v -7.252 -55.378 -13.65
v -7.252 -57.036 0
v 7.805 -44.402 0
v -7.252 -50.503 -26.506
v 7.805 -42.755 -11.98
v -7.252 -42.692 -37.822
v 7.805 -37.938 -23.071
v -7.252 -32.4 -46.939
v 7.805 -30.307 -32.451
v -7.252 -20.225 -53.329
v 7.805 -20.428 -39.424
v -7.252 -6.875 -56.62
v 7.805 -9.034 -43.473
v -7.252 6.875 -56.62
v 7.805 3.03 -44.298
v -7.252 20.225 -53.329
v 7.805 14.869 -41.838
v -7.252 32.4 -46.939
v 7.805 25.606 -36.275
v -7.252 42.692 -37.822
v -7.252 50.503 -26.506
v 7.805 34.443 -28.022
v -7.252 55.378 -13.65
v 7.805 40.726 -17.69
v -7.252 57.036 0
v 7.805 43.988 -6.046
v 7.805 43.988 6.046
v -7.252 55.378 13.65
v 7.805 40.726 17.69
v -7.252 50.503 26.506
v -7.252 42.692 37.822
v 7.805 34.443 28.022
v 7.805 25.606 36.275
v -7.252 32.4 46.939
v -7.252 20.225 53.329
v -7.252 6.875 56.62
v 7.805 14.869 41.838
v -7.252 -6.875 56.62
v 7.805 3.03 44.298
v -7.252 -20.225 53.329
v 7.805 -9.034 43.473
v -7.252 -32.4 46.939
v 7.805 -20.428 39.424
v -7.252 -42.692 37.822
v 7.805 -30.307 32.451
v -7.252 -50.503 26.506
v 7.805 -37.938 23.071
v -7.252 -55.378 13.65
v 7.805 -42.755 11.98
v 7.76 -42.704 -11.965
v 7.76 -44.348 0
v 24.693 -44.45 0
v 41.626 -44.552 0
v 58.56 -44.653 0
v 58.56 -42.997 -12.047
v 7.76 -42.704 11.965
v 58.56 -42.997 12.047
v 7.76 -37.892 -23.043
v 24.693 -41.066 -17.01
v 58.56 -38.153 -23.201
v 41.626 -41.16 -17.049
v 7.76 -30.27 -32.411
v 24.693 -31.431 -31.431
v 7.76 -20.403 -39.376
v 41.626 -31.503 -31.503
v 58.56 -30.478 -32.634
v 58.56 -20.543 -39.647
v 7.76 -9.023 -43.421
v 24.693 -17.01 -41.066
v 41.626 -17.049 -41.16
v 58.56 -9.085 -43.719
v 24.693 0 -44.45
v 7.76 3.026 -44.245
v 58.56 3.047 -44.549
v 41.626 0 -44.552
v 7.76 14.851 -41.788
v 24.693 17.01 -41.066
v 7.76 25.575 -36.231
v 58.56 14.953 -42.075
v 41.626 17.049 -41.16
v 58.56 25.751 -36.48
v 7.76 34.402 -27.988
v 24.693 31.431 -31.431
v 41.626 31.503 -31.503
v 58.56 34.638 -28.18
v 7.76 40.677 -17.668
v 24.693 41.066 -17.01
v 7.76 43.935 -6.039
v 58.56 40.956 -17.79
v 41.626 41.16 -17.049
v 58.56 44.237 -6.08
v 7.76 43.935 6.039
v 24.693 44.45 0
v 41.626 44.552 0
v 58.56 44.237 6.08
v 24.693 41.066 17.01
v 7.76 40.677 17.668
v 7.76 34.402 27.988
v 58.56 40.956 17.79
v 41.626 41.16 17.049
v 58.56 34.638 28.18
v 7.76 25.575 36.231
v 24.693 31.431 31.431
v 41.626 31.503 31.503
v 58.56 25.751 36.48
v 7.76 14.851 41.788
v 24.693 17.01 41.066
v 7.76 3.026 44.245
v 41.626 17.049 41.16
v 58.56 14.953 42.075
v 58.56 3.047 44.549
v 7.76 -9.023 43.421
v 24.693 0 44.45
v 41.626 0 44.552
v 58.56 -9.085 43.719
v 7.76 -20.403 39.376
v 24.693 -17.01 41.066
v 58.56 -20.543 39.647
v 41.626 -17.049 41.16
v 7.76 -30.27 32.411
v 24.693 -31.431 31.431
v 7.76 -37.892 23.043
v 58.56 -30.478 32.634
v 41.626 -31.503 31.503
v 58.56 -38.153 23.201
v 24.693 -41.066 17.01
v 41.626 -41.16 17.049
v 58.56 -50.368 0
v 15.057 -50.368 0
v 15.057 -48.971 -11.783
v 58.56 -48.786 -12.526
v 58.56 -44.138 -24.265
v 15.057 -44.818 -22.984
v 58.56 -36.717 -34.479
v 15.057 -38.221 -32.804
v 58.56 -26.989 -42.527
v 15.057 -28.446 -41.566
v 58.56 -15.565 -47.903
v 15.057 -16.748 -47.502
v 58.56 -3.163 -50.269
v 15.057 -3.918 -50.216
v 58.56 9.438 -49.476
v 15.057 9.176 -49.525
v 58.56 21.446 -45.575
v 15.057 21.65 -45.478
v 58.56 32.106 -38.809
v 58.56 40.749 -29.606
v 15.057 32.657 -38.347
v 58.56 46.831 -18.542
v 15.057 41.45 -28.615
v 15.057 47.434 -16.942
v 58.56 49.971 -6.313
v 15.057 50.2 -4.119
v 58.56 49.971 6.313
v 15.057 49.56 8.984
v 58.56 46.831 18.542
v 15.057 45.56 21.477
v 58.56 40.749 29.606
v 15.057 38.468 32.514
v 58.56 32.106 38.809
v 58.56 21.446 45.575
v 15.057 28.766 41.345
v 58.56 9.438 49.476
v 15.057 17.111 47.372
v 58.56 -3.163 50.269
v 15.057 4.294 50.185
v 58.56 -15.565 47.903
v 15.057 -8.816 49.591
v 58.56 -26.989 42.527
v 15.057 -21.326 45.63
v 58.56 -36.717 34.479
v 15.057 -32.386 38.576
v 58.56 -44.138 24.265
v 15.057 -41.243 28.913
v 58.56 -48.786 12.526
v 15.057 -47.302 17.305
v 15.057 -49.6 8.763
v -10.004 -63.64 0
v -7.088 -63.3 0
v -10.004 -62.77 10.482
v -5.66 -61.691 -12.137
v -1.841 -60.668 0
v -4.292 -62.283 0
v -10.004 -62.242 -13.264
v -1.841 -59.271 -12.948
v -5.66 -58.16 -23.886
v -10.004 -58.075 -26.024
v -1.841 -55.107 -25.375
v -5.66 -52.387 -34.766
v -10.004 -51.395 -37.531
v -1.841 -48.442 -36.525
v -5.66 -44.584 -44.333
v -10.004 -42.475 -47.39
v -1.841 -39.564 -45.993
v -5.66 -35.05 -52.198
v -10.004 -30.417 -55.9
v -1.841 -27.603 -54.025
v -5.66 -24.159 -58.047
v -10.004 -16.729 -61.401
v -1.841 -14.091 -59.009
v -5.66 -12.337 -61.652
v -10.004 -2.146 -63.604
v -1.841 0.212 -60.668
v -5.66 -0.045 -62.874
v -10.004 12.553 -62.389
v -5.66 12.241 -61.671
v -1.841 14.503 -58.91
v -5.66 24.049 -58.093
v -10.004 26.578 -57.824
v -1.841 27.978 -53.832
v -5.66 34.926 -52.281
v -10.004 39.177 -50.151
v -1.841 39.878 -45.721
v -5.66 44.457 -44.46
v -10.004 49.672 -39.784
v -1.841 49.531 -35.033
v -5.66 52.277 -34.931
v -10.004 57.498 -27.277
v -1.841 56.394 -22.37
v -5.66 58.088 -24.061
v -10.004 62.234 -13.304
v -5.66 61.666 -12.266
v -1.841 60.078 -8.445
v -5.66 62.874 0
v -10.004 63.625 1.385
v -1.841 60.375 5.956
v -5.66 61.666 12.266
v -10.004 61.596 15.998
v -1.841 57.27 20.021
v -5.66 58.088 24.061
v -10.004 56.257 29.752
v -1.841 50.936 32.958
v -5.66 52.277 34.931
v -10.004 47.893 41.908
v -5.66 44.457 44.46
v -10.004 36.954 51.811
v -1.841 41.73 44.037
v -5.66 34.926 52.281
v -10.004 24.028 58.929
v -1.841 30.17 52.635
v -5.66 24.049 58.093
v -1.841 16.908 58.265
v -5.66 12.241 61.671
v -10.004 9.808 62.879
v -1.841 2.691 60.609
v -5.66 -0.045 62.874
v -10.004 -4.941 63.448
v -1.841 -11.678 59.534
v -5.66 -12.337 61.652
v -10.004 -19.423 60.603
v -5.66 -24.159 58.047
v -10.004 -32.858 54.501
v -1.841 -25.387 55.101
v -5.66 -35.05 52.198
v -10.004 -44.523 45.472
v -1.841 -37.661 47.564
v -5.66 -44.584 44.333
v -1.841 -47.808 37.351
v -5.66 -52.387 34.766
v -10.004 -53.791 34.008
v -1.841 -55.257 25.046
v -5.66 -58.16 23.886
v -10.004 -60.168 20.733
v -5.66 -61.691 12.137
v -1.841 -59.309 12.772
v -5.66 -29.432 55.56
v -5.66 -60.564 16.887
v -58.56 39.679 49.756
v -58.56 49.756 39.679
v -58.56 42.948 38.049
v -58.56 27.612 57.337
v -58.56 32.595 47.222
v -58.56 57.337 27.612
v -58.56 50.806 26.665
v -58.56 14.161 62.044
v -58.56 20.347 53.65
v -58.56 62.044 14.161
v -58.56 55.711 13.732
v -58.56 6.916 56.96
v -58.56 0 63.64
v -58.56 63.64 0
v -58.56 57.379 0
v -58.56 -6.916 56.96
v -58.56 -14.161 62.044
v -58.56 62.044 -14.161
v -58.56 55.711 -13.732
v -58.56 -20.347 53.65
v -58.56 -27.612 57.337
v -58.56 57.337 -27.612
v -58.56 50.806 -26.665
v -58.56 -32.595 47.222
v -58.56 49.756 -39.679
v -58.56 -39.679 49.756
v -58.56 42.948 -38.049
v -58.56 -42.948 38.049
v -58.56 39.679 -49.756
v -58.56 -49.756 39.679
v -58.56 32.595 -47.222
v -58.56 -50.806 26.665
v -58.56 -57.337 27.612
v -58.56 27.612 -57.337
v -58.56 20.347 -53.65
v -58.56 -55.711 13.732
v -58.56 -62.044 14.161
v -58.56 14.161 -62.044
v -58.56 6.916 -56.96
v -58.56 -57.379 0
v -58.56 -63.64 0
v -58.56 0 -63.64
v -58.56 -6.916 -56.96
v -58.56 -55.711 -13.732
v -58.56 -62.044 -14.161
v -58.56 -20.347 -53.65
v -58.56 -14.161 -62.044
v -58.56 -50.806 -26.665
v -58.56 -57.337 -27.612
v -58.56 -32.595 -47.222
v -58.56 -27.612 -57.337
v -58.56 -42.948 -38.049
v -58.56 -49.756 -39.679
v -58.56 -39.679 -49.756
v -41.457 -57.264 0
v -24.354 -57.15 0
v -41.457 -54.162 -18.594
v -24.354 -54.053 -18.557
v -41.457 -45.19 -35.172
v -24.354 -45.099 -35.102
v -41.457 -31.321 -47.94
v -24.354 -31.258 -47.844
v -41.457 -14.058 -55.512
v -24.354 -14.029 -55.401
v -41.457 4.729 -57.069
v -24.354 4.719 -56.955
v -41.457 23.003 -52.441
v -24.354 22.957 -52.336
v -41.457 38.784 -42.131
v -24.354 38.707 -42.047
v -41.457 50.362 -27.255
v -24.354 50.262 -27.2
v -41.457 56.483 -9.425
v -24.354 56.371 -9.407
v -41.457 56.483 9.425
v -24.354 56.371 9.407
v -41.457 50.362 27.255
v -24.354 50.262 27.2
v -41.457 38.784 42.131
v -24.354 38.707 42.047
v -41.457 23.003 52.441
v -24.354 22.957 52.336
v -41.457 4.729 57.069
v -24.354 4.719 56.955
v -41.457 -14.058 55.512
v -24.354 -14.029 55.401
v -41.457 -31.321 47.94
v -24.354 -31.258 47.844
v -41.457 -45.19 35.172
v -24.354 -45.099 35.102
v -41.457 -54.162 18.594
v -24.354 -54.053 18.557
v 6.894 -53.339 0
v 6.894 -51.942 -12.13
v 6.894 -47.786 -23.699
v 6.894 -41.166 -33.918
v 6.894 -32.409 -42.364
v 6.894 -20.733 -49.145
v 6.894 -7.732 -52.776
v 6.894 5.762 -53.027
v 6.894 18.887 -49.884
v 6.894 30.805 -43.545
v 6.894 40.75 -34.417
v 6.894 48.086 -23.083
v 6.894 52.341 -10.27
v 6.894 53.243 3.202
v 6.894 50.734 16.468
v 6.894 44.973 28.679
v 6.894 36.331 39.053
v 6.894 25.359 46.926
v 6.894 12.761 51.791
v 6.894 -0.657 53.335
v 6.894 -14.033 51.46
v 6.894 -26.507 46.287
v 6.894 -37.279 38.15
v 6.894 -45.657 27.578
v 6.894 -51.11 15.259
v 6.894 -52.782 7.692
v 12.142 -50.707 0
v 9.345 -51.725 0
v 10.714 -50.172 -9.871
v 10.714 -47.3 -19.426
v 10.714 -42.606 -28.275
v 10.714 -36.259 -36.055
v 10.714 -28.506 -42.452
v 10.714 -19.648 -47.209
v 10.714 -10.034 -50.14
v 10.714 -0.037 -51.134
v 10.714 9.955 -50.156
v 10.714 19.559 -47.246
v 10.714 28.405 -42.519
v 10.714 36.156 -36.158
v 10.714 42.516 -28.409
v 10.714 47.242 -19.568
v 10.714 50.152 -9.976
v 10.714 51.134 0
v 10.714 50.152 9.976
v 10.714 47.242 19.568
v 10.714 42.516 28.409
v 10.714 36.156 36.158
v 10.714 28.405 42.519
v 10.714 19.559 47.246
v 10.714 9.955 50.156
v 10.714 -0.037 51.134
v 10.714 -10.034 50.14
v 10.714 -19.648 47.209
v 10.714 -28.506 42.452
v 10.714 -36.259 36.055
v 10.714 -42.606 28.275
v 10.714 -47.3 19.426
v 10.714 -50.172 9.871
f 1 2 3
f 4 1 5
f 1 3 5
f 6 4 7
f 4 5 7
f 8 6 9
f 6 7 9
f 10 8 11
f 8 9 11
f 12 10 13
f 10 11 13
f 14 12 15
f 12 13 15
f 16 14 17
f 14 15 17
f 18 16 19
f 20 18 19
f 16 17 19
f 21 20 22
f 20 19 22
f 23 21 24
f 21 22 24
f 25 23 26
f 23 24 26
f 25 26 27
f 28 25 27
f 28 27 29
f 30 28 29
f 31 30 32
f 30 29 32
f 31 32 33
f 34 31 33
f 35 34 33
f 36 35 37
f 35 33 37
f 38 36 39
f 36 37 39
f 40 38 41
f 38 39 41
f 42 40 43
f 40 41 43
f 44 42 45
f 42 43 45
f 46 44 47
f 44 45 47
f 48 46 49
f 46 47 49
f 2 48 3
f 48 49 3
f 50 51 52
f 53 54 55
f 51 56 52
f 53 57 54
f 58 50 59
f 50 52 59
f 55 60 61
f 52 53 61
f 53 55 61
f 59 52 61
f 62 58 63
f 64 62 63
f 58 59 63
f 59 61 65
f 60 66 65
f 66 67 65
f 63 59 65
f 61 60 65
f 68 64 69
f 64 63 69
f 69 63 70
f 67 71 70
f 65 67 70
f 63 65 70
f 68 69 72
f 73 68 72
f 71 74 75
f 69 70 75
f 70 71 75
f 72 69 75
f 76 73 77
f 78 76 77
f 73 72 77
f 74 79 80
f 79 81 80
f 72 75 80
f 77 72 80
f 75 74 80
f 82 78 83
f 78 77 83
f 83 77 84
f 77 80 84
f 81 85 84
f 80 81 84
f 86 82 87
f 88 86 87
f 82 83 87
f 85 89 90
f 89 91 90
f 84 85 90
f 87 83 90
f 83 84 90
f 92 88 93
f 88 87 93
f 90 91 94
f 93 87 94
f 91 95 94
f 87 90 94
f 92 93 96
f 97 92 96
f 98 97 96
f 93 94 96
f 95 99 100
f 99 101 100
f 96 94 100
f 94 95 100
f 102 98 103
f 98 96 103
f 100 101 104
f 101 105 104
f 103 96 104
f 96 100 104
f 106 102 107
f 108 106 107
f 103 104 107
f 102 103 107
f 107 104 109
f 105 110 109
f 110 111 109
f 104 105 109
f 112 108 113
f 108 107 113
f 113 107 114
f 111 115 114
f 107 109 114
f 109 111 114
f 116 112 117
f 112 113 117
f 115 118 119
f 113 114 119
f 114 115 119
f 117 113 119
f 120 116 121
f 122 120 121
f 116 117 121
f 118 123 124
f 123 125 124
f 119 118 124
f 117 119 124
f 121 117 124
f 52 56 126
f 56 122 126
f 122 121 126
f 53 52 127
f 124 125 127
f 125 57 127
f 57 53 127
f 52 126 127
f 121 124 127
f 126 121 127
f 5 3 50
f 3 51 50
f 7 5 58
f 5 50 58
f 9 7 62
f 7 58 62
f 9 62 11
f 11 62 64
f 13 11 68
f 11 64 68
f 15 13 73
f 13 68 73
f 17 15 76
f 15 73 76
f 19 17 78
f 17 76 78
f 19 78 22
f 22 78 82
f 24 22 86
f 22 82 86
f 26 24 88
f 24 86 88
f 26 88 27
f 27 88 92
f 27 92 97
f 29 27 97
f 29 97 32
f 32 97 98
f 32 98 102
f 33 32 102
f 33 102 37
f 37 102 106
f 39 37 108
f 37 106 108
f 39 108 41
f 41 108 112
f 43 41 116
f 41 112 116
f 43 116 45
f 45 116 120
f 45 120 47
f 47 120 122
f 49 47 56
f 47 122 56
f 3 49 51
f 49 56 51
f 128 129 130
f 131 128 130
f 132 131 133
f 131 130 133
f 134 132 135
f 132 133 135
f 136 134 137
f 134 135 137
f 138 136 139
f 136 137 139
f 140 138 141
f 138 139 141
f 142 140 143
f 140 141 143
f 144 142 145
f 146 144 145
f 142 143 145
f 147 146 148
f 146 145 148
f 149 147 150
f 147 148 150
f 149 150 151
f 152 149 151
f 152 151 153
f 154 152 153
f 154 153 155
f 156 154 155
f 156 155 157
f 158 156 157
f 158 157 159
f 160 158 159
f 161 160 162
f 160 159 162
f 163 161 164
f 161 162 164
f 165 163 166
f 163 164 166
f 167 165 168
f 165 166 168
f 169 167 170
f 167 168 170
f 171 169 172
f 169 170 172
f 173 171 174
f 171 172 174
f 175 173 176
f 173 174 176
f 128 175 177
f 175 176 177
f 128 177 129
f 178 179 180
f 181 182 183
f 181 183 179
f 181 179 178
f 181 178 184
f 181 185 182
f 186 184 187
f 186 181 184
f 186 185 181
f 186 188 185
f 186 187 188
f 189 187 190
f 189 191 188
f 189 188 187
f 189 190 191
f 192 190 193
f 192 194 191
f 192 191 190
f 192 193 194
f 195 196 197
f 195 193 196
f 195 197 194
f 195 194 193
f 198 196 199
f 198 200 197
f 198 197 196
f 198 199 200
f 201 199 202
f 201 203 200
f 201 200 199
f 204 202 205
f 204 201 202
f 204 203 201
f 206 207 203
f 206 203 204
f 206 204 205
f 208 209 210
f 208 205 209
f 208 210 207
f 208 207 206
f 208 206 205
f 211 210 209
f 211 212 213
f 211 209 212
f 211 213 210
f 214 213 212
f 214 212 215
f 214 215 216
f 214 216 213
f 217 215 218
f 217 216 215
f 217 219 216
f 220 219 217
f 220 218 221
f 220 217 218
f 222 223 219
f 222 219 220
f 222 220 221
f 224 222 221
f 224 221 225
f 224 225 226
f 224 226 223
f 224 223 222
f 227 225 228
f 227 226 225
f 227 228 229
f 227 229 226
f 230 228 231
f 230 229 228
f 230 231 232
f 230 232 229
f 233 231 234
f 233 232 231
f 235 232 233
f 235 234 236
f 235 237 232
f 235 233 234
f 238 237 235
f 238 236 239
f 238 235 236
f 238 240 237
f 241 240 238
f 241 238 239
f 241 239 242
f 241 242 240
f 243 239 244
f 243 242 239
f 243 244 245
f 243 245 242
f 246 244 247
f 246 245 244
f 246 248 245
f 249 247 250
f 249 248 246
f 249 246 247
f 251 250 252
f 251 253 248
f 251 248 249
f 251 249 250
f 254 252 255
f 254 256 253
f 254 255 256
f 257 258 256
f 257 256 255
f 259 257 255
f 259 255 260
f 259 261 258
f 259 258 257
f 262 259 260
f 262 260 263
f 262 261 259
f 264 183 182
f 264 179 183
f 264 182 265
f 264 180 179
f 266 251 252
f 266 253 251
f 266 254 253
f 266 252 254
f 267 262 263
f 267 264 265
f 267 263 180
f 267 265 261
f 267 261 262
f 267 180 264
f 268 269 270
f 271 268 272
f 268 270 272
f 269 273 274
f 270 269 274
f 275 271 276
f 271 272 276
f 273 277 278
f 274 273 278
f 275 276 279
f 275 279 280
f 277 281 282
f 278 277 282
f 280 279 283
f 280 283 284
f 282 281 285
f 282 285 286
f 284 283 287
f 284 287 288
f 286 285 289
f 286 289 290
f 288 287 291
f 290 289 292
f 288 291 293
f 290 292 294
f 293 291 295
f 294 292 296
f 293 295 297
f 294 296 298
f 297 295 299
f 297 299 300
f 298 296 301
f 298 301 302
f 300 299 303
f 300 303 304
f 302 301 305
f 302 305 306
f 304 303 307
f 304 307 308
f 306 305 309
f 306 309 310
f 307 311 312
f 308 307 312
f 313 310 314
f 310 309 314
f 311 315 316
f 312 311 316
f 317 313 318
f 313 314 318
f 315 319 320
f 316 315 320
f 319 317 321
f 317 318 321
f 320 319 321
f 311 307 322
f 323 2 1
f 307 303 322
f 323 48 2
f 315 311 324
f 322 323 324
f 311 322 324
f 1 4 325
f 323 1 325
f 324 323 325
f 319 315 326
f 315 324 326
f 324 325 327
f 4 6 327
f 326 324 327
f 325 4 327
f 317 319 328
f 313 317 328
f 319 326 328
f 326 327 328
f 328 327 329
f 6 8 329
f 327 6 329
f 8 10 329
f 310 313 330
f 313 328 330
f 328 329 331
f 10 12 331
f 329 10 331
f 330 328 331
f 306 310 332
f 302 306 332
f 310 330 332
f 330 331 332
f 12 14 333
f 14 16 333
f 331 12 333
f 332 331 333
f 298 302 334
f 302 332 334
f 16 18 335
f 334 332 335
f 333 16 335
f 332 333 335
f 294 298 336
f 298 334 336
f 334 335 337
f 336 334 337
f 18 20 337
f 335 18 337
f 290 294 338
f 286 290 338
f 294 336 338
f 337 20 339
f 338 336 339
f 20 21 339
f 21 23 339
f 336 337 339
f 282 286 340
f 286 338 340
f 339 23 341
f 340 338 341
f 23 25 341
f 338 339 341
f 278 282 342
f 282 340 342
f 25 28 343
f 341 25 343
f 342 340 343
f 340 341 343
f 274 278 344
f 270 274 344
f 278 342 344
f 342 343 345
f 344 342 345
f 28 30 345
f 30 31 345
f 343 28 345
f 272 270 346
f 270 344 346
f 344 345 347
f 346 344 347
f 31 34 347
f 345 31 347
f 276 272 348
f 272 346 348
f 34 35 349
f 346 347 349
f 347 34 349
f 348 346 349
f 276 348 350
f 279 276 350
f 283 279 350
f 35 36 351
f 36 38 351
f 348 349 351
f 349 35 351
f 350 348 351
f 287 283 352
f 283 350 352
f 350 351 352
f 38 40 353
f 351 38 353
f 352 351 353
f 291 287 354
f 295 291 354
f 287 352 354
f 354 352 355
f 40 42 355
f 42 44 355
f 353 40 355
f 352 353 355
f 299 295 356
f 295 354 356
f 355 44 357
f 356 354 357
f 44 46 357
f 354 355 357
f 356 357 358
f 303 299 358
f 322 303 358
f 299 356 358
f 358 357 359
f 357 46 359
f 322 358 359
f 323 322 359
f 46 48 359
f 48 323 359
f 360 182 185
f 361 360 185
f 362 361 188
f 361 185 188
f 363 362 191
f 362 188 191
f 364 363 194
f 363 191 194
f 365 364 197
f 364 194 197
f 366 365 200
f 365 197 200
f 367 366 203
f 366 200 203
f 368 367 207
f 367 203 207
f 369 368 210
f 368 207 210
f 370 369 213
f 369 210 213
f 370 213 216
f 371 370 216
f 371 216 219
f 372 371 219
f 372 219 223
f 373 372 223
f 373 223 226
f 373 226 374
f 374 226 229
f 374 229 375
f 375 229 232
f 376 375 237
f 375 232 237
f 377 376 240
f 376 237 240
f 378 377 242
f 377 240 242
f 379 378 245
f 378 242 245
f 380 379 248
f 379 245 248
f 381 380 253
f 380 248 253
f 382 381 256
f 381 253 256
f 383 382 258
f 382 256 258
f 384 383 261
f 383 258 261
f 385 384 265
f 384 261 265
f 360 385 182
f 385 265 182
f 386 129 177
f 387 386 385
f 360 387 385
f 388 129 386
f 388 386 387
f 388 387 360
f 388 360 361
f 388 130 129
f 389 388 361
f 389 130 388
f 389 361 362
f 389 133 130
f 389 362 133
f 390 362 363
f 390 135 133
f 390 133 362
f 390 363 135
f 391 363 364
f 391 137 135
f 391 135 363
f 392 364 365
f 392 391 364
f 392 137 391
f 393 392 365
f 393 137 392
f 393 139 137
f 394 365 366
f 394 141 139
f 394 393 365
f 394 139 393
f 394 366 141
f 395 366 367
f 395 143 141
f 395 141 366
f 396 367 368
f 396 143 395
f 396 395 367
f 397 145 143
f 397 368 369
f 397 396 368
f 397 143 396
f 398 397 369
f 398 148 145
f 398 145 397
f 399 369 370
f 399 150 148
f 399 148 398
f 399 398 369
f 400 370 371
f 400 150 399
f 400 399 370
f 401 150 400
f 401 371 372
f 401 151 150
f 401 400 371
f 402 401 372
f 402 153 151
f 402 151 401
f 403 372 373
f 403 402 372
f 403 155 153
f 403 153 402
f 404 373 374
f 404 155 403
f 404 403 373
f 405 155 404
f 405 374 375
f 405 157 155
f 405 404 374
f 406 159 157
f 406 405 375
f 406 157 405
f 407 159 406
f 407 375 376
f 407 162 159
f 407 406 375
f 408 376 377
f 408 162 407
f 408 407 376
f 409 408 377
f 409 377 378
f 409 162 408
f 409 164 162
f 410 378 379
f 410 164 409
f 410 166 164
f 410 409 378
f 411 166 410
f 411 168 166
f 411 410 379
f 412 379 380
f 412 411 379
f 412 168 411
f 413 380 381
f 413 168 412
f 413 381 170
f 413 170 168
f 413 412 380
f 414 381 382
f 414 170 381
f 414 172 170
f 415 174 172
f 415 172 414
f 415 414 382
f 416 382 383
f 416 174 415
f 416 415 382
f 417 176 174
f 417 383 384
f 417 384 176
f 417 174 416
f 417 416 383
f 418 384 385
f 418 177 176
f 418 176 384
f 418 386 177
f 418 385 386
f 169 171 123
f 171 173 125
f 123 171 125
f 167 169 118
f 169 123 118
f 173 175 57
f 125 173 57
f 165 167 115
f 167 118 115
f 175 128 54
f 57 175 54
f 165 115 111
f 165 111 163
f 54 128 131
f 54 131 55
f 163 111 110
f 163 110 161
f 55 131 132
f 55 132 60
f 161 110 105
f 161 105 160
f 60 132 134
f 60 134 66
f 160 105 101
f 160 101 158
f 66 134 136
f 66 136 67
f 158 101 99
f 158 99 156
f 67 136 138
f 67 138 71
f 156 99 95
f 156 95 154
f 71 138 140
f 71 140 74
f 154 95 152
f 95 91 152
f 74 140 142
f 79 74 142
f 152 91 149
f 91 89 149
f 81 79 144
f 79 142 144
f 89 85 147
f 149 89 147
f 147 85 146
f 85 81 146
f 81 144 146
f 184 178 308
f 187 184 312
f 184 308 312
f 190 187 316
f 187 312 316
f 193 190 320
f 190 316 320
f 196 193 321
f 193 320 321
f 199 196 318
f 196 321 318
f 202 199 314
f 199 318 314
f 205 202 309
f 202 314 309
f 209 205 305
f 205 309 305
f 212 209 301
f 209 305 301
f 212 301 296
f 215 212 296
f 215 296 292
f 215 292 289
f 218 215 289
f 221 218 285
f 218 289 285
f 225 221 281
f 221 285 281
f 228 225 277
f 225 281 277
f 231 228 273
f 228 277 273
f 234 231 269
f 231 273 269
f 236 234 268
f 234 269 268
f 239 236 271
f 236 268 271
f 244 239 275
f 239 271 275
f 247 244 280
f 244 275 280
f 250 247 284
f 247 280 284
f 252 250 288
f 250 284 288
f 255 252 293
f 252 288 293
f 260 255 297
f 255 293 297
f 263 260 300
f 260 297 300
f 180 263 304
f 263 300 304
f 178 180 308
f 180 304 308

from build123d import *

# Parameters (mm, degrees)
FILLET1_R = 12.7


with BuildPart() as part:
    # Sketch1 → Revolve1 (revolve)
    with BuildSketch(Plane.XY):
        Polygon((-7.2517, -57.0357), (7.80462683, -44.40194171), (7.7597, -44.3484), (58.5597, -44.6532), (58.5597, -50.3682), (10.434859531, -50.3682), (-5.381498273, -63.6397), (-58.5597, -63.6397), (-58.5597, -57.3786), align=None)
    revolve(axis=Axis((-58.5597, 0, 0), (1, 0, 0)))

    # Fillet1
    fillet1_edges = [part.edges().sort_by_distance(p)[0] for p in [
        (-5.381498273, 63.6397, 0),
        (10.434859531, 50.3682, 0),
    ]]
    fillet(fillet1_edges, radius=FILLET1_R)


solid = part.part
